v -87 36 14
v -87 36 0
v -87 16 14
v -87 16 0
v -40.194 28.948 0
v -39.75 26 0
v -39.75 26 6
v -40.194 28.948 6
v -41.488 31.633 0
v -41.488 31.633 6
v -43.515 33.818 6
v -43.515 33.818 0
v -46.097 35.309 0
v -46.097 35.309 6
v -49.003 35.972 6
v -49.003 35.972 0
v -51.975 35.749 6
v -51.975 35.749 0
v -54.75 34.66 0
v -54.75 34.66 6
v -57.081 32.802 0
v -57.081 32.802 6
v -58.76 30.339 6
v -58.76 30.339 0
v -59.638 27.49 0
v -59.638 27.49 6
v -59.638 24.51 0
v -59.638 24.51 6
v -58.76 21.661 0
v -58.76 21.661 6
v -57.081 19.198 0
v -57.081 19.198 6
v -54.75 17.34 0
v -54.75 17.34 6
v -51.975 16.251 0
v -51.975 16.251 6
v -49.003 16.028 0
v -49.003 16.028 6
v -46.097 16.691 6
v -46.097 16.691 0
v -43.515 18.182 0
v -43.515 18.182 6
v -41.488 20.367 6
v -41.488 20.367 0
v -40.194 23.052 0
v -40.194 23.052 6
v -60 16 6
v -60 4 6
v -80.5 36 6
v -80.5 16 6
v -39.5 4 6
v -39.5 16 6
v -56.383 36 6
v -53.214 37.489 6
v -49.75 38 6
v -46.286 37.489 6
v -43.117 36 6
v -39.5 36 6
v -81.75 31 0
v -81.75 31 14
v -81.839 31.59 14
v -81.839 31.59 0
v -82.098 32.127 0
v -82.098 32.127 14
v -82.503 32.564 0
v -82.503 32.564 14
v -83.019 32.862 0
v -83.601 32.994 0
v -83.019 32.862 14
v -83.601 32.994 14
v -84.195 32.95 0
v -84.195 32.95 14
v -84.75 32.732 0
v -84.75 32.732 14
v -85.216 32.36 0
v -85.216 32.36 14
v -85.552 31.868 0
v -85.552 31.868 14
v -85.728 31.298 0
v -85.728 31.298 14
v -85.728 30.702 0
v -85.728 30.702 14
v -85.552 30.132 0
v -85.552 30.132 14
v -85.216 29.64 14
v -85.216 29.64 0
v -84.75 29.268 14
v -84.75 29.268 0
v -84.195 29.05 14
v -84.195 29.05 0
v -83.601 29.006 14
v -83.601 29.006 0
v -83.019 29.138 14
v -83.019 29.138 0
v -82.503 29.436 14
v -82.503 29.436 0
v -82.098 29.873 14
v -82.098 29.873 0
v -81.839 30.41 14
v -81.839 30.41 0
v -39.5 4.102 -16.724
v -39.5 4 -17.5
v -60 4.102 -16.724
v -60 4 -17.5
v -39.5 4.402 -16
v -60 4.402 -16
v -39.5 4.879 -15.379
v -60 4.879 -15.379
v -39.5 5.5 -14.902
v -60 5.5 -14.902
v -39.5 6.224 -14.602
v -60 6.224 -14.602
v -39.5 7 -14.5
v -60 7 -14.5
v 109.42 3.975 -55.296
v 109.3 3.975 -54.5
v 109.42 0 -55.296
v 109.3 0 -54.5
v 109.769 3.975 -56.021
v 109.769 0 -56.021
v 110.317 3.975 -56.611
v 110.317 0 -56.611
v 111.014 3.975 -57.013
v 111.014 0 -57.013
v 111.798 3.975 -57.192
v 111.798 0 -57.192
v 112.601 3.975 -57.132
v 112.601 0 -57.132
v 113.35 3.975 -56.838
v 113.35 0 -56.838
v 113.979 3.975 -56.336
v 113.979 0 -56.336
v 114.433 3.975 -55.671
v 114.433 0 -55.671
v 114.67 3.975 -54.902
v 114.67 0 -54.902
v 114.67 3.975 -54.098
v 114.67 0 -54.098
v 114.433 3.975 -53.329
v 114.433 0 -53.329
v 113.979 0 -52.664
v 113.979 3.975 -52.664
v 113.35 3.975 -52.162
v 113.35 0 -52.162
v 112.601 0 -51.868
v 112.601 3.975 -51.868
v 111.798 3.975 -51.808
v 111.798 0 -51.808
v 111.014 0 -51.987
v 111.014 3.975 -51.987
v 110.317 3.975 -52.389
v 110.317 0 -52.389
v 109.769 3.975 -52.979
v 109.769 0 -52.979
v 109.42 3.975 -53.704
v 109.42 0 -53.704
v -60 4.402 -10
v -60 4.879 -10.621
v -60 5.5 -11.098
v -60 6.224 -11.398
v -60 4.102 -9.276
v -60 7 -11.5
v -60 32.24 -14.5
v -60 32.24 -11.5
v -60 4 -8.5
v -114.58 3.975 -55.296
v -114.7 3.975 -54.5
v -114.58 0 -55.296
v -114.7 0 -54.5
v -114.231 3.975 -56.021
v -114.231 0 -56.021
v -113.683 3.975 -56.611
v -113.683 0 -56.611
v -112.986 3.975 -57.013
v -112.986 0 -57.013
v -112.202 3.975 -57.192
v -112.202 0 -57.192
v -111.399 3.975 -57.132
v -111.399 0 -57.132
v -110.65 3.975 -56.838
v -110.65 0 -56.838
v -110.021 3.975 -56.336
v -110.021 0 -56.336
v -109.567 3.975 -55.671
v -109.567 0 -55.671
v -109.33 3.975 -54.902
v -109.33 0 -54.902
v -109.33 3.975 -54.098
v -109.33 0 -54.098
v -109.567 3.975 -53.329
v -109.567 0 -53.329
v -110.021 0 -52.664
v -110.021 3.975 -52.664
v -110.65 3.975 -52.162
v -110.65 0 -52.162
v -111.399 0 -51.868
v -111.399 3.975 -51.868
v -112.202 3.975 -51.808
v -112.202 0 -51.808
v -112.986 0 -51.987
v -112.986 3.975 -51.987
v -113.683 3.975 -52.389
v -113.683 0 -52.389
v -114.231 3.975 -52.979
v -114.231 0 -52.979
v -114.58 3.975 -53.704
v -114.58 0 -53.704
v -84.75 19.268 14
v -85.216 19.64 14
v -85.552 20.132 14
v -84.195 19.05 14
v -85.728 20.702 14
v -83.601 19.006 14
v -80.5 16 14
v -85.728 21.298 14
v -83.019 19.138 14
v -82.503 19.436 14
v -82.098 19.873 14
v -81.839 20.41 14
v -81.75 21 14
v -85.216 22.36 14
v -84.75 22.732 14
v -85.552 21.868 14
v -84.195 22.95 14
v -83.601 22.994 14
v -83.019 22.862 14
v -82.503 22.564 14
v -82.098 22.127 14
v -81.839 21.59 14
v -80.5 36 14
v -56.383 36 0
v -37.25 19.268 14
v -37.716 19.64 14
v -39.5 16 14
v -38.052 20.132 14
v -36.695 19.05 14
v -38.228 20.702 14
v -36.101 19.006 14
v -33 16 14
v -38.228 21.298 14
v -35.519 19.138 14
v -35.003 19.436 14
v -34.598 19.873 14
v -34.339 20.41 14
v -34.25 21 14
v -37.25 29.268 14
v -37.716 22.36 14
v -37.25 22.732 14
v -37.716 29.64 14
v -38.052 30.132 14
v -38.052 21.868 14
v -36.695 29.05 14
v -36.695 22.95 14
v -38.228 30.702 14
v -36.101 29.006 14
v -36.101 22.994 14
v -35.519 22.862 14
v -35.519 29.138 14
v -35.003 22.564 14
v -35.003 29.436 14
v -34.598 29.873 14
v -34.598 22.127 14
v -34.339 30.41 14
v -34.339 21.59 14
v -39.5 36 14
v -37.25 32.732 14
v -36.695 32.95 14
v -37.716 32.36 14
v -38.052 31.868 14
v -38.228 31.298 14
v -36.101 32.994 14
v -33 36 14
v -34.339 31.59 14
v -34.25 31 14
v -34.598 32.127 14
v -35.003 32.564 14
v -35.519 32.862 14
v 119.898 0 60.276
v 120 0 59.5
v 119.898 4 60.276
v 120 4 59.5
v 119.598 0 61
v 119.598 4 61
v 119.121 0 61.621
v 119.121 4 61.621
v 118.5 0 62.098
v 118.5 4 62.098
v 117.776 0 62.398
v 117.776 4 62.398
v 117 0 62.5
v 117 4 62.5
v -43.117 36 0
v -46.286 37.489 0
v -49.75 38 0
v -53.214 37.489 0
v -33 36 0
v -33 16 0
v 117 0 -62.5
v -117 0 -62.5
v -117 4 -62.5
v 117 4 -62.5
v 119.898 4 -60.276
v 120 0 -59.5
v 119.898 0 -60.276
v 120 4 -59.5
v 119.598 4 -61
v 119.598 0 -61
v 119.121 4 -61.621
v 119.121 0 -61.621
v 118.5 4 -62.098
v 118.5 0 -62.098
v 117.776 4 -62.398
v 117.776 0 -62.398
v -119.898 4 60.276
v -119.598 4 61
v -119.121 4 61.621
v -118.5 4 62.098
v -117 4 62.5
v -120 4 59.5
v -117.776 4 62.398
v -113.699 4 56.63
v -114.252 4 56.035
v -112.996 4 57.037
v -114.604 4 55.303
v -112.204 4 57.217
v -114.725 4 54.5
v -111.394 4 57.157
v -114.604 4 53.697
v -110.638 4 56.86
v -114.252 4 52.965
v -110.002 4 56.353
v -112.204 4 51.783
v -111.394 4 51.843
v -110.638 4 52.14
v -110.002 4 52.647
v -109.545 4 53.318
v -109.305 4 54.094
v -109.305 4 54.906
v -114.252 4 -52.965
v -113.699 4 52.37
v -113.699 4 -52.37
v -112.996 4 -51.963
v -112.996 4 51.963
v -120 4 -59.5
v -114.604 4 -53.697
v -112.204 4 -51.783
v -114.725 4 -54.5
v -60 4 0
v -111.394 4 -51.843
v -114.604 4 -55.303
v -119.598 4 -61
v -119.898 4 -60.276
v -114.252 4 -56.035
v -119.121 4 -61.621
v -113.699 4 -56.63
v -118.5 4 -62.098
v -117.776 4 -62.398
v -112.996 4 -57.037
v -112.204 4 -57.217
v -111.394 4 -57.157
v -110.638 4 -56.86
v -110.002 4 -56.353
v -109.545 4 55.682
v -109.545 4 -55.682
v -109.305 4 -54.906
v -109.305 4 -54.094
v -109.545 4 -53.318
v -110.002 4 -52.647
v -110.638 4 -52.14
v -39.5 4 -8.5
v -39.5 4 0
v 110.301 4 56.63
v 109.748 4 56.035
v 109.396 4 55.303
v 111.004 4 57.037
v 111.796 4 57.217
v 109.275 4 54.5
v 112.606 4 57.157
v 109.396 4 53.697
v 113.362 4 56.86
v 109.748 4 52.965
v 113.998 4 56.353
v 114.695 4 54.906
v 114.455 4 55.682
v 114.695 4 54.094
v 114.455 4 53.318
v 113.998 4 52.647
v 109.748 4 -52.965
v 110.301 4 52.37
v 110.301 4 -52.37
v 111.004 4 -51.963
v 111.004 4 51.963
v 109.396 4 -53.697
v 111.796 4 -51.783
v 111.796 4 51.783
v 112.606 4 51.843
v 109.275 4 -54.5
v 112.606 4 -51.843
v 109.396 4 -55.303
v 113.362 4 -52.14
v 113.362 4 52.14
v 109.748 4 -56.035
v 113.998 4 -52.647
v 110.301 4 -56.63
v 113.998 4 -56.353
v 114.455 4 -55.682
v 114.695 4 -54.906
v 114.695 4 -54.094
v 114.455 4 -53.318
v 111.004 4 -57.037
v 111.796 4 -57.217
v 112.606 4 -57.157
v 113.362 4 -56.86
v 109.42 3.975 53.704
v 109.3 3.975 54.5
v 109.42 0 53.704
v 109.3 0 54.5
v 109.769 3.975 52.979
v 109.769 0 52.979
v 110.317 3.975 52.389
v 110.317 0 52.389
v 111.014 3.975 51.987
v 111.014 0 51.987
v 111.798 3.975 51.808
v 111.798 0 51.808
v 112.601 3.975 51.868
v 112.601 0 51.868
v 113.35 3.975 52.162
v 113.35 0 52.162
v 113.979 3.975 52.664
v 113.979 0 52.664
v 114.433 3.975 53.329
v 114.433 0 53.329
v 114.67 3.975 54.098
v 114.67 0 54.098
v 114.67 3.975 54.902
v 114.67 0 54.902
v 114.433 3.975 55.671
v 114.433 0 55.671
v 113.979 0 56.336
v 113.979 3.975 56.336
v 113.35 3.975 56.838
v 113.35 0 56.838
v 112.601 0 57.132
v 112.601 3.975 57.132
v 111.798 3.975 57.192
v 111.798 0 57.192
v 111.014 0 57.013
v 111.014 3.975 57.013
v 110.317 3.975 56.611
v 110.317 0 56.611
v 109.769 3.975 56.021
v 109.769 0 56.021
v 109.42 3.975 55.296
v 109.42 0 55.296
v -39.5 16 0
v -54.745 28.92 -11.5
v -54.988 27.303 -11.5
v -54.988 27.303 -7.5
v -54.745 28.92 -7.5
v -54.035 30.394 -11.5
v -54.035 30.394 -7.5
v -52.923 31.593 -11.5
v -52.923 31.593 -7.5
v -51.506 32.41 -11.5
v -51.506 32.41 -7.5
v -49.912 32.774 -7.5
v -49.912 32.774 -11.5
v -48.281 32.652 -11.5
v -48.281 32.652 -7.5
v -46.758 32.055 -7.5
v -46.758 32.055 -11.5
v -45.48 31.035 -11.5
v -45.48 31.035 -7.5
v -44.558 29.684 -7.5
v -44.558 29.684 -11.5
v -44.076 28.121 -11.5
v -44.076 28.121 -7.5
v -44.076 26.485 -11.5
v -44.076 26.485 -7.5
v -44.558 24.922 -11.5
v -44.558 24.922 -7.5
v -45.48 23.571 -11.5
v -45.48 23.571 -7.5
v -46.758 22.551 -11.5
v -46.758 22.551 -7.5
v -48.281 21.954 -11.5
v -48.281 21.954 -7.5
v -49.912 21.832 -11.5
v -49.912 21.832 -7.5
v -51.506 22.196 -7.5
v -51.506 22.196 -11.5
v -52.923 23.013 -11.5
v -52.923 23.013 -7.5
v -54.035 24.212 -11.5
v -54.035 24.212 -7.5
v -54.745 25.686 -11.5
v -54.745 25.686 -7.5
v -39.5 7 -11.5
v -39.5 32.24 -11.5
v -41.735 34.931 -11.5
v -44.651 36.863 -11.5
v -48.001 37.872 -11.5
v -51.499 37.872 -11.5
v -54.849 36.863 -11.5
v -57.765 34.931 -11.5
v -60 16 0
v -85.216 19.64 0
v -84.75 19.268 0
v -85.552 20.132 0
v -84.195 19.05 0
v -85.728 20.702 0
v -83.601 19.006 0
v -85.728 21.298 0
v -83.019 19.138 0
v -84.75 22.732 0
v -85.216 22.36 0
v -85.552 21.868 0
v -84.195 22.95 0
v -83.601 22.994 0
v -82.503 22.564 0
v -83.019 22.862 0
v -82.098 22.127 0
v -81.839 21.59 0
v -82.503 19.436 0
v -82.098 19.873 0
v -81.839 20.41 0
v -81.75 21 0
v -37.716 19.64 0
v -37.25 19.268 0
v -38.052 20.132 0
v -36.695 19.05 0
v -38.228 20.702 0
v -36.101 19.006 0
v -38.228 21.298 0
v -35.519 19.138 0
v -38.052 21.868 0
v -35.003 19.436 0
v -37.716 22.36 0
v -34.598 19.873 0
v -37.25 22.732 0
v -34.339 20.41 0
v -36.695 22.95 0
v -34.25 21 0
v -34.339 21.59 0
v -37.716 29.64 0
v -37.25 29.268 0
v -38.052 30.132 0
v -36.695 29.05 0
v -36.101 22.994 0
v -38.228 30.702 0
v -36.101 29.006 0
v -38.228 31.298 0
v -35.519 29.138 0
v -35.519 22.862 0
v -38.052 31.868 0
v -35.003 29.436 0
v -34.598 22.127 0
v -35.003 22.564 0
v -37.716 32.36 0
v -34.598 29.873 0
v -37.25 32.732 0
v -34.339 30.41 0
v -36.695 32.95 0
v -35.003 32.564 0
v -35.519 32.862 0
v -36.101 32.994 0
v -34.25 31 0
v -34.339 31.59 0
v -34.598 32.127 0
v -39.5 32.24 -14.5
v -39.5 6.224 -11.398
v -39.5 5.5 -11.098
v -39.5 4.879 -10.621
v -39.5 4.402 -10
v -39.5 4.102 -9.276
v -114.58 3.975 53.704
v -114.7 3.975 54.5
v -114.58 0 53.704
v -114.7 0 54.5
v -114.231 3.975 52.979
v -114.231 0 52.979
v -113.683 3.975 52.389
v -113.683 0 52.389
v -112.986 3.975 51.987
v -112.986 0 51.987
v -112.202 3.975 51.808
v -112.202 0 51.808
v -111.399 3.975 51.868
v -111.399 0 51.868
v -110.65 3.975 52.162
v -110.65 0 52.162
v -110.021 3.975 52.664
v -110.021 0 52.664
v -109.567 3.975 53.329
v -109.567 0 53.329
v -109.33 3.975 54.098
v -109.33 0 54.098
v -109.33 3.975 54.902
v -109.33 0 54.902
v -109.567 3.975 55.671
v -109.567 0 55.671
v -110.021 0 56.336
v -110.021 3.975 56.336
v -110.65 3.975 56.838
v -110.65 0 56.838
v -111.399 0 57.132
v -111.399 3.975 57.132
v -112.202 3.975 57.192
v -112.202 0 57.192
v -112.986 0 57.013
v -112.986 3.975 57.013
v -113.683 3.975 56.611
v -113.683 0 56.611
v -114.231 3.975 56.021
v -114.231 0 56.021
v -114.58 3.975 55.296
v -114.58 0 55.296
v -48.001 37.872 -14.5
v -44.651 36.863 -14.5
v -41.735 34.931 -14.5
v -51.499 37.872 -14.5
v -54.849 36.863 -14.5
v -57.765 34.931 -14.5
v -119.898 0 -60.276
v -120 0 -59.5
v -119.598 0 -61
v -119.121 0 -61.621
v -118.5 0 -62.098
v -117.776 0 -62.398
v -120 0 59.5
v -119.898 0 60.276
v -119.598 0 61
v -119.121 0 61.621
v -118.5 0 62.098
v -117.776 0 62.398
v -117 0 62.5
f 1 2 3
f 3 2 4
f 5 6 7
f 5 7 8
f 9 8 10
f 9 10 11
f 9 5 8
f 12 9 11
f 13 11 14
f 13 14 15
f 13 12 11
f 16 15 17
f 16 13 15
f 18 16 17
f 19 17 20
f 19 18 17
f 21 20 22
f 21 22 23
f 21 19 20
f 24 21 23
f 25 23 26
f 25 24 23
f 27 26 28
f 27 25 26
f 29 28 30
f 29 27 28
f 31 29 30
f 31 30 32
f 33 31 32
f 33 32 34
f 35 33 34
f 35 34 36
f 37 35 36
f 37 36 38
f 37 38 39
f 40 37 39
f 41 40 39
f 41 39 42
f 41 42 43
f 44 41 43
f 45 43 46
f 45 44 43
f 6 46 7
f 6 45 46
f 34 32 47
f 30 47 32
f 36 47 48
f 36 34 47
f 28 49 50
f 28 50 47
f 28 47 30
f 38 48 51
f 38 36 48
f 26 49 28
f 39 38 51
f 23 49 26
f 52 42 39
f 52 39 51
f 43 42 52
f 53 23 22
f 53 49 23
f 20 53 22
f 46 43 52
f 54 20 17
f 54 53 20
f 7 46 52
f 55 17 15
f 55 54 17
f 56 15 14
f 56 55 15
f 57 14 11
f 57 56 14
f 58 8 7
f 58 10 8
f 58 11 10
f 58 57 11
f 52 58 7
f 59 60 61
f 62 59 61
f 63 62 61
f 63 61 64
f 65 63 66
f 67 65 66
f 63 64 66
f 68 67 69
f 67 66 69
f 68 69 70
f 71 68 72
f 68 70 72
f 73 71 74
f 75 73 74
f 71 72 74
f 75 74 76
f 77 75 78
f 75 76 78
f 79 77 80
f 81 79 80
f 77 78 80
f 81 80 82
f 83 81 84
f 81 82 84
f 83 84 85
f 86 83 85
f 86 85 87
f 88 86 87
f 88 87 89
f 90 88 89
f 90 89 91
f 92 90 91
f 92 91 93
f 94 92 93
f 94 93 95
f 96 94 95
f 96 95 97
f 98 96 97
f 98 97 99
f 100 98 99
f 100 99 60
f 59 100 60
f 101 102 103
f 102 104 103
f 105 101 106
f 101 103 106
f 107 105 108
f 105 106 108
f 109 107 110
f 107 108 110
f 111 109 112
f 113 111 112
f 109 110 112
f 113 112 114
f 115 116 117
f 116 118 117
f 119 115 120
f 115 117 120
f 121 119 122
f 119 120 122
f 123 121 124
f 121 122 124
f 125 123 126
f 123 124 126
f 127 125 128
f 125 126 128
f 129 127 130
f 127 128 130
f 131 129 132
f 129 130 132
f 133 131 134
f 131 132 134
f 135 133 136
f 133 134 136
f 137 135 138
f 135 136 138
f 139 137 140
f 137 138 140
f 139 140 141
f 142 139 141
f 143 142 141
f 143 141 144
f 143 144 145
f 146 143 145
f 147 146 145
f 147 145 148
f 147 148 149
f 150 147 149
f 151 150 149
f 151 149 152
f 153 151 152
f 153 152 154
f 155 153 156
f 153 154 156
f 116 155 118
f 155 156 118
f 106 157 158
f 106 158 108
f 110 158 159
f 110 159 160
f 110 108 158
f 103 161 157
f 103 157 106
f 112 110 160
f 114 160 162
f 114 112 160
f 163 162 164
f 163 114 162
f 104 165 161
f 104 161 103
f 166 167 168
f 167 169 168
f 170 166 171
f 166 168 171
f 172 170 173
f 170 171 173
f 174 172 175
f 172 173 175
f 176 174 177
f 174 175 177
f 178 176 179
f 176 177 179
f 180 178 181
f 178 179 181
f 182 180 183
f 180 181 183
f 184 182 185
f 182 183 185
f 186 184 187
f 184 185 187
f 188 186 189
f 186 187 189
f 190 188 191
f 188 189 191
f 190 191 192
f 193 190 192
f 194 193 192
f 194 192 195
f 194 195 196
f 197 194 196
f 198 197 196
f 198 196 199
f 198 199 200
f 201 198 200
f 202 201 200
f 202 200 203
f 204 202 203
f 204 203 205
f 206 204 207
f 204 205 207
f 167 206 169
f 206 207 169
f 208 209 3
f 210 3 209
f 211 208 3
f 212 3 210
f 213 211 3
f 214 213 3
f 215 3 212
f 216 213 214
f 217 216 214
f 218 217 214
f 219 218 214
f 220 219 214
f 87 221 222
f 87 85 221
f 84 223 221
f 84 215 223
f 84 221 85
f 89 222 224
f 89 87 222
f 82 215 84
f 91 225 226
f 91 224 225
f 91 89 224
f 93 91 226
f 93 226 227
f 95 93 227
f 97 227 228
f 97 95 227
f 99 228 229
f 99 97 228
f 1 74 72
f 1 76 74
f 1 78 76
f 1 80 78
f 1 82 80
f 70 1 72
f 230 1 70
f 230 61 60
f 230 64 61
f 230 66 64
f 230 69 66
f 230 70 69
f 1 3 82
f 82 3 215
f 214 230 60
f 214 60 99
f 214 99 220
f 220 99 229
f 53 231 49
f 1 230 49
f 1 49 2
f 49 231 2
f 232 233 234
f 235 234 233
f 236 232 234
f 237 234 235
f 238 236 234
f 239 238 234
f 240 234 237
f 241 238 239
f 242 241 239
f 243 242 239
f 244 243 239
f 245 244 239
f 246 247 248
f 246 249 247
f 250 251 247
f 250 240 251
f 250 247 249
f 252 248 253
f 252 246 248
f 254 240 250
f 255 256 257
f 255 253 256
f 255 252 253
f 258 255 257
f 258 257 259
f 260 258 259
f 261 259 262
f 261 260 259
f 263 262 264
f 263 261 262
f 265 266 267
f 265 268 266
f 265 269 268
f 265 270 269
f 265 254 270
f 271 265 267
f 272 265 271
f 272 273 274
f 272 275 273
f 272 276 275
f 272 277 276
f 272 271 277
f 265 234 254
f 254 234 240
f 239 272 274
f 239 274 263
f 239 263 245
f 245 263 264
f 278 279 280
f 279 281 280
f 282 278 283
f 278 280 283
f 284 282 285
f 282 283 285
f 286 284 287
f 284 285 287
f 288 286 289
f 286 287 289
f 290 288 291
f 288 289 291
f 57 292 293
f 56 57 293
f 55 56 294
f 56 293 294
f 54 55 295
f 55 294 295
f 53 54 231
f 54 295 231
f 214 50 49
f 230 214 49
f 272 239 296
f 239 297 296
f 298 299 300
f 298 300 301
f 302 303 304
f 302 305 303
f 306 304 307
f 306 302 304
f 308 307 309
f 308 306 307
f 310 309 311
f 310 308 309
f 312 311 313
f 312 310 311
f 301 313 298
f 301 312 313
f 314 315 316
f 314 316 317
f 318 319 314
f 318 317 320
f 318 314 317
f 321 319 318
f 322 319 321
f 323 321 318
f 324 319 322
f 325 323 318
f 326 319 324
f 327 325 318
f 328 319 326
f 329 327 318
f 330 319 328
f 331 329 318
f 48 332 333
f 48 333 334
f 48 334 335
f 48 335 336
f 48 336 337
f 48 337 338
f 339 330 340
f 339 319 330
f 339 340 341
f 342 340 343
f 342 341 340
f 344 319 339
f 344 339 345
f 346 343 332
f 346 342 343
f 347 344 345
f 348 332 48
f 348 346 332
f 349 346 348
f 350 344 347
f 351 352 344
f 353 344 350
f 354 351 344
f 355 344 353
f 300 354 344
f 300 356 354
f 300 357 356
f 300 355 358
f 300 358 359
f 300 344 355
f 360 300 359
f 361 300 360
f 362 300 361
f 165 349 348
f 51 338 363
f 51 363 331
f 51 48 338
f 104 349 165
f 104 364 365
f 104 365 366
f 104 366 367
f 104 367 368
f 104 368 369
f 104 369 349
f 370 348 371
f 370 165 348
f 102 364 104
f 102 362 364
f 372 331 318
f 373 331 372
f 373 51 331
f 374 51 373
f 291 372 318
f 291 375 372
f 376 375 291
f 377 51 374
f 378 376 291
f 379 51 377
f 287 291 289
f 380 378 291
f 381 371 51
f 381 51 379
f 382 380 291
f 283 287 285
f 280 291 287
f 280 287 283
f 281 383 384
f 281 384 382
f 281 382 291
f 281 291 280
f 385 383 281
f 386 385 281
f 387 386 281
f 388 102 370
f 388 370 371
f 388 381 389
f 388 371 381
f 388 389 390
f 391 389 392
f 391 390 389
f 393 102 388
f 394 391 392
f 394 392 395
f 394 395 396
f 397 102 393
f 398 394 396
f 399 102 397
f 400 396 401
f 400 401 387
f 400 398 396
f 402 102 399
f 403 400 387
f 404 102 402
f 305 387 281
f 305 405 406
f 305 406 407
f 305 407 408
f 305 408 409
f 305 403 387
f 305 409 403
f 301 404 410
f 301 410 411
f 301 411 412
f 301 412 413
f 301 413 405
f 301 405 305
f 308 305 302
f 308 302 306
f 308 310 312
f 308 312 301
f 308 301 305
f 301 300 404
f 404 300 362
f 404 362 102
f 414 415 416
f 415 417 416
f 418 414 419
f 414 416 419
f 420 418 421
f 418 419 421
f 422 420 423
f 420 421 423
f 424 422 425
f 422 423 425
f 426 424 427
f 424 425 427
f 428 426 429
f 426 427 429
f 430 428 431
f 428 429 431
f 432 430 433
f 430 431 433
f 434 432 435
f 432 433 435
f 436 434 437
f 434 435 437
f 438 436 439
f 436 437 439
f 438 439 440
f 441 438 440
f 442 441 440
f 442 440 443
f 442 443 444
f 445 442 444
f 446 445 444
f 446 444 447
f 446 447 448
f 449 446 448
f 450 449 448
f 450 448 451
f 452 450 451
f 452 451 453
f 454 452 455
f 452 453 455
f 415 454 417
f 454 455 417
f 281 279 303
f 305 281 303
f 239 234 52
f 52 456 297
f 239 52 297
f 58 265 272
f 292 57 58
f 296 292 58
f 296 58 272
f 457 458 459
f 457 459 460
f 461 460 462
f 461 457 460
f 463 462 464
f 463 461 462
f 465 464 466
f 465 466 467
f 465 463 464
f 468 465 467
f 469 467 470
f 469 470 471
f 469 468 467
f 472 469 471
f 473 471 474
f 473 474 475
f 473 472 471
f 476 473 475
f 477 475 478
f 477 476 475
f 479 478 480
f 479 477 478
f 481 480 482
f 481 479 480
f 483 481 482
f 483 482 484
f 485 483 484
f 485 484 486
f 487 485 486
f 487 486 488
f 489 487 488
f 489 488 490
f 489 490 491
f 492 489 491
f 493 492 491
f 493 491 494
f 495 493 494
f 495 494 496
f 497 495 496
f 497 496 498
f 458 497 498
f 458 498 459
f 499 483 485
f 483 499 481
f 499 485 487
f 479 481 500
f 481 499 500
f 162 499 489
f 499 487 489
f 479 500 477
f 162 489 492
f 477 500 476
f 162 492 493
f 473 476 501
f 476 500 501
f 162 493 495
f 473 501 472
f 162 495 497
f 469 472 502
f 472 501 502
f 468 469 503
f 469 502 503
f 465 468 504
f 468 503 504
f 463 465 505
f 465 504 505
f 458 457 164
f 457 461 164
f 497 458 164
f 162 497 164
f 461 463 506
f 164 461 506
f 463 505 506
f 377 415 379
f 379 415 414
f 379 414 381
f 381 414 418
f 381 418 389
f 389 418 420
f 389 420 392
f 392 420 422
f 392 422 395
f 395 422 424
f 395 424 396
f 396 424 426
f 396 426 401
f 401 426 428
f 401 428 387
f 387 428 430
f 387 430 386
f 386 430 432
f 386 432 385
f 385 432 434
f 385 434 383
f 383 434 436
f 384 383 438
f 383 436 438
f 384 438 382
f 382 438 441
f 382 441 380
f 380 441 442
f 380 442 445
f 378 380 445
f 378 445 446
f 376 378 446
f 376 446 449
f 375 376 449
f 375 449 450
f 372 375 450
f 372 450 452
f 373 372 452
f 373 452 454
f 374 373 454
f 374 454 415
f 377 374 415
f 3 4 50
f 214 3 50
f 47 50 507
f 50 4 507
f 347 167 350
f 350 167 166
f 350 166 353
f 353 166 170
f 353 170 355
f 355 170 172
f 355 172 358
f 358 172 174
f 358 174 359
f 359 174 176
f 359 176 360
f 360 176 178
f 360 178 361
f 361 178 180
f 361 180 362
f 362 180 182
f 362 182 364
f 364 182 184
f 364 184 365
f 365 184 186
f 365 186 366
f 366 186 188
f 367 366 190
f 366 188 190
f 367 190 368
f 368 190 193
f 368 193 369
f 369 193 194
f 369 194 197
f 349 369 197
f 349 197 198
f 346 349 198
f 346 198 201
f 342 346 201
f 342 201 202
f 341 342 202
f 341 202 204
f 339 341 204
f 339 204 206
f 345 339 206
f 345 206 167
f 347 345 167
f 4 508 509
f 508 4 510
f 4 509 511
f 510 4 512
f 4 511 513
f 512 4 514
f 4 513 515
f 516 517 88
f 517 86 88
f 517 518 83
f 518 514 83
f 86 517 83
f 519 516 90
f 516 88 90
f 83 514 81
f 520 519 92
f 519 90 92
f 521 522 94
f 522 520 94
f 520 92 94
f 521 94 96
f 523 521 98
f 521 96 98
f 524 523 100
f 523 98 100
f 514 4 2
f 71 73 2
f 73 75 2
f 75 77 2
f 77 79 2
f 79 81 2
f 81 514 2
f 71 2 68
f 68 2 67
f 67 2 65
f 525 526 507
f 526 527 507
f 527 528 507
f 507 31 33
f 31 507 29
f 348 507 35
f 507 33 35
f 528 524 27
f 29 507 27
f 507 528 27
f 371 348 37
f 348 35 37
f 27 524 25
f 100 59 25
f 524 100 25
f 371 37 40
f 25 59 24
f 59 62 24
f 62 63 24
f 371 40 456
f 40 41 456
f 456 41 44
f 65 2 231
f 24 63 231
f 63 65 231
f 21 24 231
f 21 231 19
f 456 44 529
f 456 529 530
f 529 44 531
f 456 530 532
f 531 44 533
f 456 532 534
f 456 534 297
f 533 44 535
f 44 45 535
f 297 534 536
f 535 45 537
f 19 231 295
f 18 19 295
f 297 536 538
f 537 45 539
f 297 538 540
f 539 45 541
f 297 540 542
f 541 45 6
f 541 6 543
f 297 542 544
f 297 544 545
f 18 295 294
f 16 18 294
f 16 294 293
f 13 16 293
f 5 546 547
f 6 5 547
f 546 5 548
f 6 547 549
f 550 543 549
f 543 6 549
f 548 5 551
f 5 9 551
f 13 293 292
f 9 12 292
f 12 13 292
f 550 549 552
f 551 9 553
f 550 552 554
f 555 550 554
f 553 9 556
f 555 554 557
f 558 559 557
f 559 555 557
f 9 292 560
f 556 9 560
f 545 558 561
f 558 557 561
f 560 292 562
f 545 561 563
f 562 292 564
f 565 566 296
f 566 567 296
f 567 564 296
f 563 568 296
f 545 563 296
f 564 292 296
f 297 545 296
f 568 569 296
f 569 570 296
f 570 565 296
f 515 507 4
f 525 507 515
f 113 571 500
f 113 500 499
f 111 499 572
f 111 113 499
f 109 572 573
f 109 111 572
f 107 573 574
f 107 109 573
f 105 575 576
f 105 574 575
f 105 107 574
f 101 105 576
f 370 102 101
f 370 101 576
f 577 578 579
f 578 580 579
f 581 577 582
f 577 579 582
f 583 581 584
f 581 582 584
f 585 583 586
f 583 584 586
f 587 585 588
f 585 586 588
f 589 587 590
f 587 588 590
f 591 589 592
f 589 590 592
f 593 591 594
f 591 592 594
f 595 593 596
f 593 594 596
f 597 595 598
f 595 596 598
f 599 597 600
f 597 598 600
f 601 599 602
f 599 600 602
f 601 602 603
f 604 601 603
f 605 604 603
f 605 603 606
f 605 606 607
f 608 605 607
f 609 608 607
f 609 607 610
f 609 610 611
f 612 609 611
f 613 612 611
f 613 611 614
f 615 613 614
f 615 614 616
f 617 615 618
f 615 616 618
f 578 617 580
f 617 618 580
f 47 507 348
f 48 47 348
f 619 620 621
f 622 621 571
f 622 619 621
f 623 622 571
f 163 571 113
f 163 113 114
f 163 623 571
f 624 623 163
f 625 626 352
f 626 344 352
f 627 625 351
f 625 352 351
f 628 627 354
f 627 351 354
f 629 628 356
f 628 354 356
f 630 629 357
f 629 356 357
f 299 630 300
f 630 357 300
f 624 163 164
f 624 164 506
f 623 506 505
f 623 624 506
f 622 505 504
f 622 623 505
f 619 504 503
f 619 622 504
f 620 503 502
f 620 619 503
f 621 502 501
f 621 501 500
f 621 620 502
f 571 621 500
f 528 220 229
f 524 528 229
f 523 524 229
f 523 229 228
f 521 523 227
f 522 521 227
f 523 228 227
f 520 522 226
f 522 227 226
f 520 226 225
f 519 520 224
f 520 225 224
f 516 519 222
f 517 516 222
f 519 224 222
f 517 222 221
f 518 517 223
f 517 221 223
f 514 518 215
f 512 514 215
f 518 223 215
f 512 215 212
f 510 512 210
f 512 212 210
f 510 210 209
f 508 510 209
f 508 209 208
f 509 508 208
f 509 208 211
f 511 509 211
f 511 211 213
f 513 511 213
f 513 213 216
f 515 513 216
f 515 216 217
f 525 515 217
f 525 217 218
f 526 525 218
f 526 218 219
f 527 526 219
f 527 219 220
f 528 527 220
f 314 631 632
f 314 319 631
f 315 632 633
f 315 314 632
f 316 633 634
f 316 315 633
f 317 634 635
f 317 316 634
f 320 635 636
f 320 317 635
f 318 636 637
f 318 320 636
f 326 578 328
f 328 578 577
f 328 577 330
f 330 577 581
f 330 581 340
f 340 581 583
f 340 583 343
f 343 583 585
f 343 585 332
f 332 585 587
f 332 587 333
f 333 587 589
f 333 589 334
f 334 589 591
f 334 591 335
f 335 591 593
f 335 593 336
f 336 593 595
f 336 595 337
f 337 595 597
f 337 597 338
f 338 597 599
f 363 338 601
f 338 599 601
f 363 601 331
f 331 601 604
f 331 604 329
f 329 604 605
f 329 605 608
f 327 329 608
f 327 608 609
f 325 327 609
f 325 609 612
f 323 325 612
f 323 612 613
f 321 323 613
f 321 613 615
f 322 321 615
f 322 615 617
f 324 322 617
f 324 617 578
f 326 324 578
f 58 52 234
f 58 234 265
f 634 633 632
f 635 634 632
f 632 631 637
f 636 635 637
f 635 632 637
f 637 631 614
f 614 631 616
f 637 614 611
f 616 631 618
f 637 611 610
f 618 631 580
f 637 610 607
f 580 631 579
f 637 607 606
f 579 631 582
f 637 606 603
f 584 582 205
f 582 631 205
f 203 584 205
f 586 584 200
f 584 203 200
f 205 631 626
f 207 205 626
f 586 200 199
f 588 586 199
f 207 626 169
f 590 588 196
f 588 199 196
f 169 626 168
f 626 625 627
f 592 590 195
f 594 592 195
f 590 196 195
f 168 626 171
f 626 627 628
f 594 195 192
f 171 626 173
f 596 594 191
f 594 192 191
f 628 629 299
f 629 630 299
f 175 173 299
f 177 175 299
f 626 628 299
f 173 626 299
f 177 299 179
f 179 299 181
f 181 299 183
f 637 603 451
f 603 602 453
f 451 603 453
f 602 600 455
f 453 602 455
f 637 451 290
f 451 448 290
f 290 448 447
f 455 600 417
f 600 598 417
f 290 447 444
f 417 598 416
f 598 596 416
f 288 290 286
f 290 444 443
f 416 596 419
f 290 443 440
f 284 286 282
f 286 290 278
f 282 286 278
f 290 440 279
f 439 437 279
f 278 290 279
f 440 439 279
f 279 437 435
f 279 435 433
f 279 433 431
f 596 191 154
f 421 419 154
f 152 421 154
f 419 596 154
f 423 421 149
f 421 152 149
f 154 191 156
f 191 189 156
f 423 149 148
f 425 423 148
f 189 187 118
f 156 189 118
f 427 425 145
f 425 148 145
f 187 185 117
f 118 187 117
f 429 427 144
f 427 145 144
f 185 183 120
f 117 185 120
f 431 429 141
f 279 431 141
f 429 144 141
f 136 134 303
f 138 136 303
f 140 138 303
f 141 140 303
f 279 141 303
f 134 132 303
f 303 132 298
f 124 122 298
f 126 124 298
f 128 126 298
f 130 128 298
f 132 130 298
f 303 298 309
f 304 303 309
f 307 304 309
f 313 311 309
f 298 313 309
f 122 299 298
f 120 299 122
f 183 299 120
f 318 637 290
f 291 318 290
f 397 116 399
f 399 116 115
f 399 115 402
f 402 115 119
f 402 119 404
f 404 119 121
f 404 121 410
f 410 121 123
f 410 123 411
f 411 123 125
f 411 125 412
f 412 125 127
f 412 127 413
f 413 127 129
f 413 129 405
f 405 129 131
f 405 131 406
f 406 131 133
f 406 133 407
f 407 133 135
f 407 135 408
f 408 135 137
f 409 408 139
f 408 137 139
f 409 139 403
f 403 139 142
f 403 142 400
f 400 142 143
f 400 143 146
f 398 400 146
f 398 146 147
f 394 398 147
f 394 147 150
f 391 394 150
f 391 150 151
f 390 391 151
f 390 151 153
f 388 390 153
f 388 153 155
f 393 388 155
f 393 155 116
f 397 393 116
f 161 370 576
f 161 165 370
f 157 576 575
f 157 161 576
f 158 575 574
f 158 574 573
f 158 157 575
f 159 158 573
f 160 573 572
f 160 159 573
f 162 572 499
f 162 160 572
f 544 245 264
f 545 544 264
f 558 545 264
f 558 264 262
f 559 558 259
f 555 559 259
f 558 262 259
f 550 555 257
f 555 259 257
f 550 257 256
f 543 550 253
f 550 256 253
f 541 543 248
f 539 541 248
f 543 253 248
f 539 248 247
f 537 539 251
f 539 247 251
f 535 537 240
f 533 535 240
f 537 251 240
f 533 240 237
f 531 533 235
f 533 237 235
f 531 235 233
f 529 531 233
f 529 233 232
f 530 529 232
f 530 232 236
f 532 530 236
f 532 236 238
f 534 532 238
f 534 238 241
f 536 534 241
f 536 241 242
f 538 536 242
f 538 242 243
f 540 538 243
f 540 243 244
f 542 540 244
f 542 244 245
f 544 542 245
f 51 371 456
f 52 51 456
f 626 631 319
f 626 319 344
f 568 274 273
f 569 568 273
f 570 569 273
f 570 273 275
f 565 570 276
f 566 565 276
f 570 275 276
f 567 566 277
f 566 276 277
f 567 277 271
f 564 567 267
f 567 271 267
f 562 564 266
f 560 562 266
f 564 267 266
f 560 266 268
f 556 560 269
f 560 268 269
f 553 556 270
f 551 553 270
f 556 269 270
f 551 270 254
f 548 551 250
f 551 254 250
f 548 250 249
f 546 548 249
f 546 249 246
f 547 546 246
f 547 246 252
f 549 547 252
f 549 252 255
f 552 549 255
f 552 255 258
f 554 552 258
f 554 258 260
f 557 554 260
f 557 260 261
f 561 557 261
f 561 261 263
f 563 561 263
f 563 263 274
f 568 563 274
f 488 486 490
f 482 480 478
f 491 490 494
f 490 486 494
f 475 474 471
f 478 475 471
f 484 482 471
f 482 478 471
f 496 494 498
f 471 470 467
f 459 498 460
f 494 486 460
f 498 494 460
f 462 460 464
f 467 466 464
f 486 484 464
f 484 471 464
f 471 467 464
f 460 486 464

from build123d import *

# Parameters (mm, degrees)
SKETCH_1_W                        = 240
SKETCH_1_H                        = 125
EXTRUDE_1_DEPTH                   = 4
HOLE_WIZARD_5_4_5_4_1_D           = 5.4
HOLE_WIZARD_5_4_5_4_1_CSINK_D     = 5.45
HOLE_WIZARD_5_4_5_4_1_CSINK_ANGLE = 90
FILLET_1_R                        = 3
SKETCH_5_R                        = 10
EXTRUDE_2_DEPTH                   = 6
EXTRUDE_START                     = 14.5
EXTRUDE_3_DEPTH                   = 3
FILLET_2_R                        = 3
SKETCH_8_W                        = 6.5
SKETCH_8_H                        = 20
EXTRUDE_4_DEPTH                   = 8
SKETCH_10_R                       = 2
CUT_EXTRUDE_1_DEPTH               = 148.296469747
SKETCH_11_R                       = 5.486659136
EXTRUDE_5_DEPTH                   = 7


with BuildPart() as part:
    # 草图1 → 凸台-拉伸1 (new body)
    with BuildSketch(Plane(origin=(0, 0, 0), x_dir=(1, 0, 0), z_dir=(0, 1, 0))):
        Rectangle(SKETCH_1_W, SKETCH_1_H)
    extrude(amount=EXTRUDE_1_DEPTH)

    # Ø5.4 (5.4) 直径孔1 (through all)
    with Locations(Plane(origin=(0, 4, 0), x_dir=(1, 0, 0), z_dir=(0, 1, 0))):
        with Locations((112, 54.5), (-112, 54.5), (-112, -54.5), (112, -54.5)):
            CounterSinkHole(HOLE_WIZARD_5_4_5_4_1_D / 2, HOLE_WIZARD_5_4_5_4_1_CSINK_D / 2, counter_sink_angle=HOLE_WIZARD_5_4_5_4_1_CSINK_ANGLE)

    # 圆角1
    fillet_1_edges = [part.edges().sort_by_distance(p)[0] for p in [
        (120, 2, 62.5),
        (-120, 2, 62.5),
        (-120, 2, -62.5),
        (120, 2, -62.5),
    ]]
    fillet(fillet_1_edges, radius=FILLET_1_R)

    # 草图5 → 凸台-拉伸2 (add)
    with BuildSketch(Plane.XY):
        with BuildLine():
            Line((-60, 4), (-39.5, 4))
            Line((-39.5, 4), (-39.5, 16))
            Line((-39.5, 16), (-33, 16))
            Line((-33, 16), (-33, 36))
            Line((-33, 36), (-43.116750419, 36))
            ThreePointArc((-43.116750419, 36), (-49.75, 38), (-56.383249581, 36))
            Line((-56.383249581, 36), (-87, 36))
            Line((-87, 36), (-87, 16))
            Line((-87, 16), (-60, 16))
            Line((-60, 16), (-60, 4))
        make_face()
        with Locations((-49.75, 26)):
            Circle(SKETCH_5_R, mode=Mode.SUBTRACT)
    extrude(amount=EXTRUDE_2_DEPTH)

    # 草图6 → 凸台-拉伸3 (add)
    with BuildSketch(Plane(origin=(0, 0, 0), x_dir=(-1, 0, 0), z_dir=(0, 0, -1)).offset(EXTRUDE_START)):
        with BuildLine():
            Line((39.5, 4), (60, 4))
            Line((60, 4), (60, 32.239991987))
            ThreePointArc((60, 32.239991987), (49.75, 38), (39.5, 32.239991987))
            Line((39.5, 32.239991987), (39.5, 4))
        make_face()
    extrude(amount=-EXTRUDE_3_DEPTH)

    # 圆角2
    fillet_2_edges = [part.edges().sort_by_distance(p)[0] for p in [
        (-49.75, 4, -11.5),
        (-49.75, 4, -14.5),
    ]]
    fillet(fillet_2_edges, radius=FILLET_2_R)

    # 草图8 → 凸台-拉伸4 (add)
    with BuildSketch(Plane.XY.offset(6)):
        with Locations((-36.25, 26)):
            Rectangle(SKETCH_8_W, SKETCH_8_H)
        with Locations((-83.75, 26)):
            Rectangle(SKETCH_8_W, SKETCH_8_H)
    extrude(amount=EXTRUDE_4_DEPTH)

    # 草图10 → 切除-拉伸1 (cut, through all)
    with BuildSketch(Plane.XY.offset(14)):
        with Locations((-83.75, 31)):
            Circle(SKETCH_10_R)
        with Locations((-83.75, 21)):
            Circle(SKETCH_10_R)
        with Locations((-36.25, 21)):
            Circle(SKETCH_10_R)
        with Locations((-36.25, 31)):
            Circle(SKETCH_10_R)
    extrude(amount=-CUT_EXTRUDE_1_DEPTH, mode=Mode.SUBTRACT)

    # 草图11 → 凸台-拉伸5 (add)
    with BuildSketch(Plane(origin=(0, 0, -14.5), x_dir=(-1, 0, 0), z_dir=(0, 0, -1))):
        with Locations((49.501785155, 27.302934709)):
            Circle(SKETCH_11_R)
    extrude(amount=-EXTRUDE_5_DEPTH)


solid = part.part
